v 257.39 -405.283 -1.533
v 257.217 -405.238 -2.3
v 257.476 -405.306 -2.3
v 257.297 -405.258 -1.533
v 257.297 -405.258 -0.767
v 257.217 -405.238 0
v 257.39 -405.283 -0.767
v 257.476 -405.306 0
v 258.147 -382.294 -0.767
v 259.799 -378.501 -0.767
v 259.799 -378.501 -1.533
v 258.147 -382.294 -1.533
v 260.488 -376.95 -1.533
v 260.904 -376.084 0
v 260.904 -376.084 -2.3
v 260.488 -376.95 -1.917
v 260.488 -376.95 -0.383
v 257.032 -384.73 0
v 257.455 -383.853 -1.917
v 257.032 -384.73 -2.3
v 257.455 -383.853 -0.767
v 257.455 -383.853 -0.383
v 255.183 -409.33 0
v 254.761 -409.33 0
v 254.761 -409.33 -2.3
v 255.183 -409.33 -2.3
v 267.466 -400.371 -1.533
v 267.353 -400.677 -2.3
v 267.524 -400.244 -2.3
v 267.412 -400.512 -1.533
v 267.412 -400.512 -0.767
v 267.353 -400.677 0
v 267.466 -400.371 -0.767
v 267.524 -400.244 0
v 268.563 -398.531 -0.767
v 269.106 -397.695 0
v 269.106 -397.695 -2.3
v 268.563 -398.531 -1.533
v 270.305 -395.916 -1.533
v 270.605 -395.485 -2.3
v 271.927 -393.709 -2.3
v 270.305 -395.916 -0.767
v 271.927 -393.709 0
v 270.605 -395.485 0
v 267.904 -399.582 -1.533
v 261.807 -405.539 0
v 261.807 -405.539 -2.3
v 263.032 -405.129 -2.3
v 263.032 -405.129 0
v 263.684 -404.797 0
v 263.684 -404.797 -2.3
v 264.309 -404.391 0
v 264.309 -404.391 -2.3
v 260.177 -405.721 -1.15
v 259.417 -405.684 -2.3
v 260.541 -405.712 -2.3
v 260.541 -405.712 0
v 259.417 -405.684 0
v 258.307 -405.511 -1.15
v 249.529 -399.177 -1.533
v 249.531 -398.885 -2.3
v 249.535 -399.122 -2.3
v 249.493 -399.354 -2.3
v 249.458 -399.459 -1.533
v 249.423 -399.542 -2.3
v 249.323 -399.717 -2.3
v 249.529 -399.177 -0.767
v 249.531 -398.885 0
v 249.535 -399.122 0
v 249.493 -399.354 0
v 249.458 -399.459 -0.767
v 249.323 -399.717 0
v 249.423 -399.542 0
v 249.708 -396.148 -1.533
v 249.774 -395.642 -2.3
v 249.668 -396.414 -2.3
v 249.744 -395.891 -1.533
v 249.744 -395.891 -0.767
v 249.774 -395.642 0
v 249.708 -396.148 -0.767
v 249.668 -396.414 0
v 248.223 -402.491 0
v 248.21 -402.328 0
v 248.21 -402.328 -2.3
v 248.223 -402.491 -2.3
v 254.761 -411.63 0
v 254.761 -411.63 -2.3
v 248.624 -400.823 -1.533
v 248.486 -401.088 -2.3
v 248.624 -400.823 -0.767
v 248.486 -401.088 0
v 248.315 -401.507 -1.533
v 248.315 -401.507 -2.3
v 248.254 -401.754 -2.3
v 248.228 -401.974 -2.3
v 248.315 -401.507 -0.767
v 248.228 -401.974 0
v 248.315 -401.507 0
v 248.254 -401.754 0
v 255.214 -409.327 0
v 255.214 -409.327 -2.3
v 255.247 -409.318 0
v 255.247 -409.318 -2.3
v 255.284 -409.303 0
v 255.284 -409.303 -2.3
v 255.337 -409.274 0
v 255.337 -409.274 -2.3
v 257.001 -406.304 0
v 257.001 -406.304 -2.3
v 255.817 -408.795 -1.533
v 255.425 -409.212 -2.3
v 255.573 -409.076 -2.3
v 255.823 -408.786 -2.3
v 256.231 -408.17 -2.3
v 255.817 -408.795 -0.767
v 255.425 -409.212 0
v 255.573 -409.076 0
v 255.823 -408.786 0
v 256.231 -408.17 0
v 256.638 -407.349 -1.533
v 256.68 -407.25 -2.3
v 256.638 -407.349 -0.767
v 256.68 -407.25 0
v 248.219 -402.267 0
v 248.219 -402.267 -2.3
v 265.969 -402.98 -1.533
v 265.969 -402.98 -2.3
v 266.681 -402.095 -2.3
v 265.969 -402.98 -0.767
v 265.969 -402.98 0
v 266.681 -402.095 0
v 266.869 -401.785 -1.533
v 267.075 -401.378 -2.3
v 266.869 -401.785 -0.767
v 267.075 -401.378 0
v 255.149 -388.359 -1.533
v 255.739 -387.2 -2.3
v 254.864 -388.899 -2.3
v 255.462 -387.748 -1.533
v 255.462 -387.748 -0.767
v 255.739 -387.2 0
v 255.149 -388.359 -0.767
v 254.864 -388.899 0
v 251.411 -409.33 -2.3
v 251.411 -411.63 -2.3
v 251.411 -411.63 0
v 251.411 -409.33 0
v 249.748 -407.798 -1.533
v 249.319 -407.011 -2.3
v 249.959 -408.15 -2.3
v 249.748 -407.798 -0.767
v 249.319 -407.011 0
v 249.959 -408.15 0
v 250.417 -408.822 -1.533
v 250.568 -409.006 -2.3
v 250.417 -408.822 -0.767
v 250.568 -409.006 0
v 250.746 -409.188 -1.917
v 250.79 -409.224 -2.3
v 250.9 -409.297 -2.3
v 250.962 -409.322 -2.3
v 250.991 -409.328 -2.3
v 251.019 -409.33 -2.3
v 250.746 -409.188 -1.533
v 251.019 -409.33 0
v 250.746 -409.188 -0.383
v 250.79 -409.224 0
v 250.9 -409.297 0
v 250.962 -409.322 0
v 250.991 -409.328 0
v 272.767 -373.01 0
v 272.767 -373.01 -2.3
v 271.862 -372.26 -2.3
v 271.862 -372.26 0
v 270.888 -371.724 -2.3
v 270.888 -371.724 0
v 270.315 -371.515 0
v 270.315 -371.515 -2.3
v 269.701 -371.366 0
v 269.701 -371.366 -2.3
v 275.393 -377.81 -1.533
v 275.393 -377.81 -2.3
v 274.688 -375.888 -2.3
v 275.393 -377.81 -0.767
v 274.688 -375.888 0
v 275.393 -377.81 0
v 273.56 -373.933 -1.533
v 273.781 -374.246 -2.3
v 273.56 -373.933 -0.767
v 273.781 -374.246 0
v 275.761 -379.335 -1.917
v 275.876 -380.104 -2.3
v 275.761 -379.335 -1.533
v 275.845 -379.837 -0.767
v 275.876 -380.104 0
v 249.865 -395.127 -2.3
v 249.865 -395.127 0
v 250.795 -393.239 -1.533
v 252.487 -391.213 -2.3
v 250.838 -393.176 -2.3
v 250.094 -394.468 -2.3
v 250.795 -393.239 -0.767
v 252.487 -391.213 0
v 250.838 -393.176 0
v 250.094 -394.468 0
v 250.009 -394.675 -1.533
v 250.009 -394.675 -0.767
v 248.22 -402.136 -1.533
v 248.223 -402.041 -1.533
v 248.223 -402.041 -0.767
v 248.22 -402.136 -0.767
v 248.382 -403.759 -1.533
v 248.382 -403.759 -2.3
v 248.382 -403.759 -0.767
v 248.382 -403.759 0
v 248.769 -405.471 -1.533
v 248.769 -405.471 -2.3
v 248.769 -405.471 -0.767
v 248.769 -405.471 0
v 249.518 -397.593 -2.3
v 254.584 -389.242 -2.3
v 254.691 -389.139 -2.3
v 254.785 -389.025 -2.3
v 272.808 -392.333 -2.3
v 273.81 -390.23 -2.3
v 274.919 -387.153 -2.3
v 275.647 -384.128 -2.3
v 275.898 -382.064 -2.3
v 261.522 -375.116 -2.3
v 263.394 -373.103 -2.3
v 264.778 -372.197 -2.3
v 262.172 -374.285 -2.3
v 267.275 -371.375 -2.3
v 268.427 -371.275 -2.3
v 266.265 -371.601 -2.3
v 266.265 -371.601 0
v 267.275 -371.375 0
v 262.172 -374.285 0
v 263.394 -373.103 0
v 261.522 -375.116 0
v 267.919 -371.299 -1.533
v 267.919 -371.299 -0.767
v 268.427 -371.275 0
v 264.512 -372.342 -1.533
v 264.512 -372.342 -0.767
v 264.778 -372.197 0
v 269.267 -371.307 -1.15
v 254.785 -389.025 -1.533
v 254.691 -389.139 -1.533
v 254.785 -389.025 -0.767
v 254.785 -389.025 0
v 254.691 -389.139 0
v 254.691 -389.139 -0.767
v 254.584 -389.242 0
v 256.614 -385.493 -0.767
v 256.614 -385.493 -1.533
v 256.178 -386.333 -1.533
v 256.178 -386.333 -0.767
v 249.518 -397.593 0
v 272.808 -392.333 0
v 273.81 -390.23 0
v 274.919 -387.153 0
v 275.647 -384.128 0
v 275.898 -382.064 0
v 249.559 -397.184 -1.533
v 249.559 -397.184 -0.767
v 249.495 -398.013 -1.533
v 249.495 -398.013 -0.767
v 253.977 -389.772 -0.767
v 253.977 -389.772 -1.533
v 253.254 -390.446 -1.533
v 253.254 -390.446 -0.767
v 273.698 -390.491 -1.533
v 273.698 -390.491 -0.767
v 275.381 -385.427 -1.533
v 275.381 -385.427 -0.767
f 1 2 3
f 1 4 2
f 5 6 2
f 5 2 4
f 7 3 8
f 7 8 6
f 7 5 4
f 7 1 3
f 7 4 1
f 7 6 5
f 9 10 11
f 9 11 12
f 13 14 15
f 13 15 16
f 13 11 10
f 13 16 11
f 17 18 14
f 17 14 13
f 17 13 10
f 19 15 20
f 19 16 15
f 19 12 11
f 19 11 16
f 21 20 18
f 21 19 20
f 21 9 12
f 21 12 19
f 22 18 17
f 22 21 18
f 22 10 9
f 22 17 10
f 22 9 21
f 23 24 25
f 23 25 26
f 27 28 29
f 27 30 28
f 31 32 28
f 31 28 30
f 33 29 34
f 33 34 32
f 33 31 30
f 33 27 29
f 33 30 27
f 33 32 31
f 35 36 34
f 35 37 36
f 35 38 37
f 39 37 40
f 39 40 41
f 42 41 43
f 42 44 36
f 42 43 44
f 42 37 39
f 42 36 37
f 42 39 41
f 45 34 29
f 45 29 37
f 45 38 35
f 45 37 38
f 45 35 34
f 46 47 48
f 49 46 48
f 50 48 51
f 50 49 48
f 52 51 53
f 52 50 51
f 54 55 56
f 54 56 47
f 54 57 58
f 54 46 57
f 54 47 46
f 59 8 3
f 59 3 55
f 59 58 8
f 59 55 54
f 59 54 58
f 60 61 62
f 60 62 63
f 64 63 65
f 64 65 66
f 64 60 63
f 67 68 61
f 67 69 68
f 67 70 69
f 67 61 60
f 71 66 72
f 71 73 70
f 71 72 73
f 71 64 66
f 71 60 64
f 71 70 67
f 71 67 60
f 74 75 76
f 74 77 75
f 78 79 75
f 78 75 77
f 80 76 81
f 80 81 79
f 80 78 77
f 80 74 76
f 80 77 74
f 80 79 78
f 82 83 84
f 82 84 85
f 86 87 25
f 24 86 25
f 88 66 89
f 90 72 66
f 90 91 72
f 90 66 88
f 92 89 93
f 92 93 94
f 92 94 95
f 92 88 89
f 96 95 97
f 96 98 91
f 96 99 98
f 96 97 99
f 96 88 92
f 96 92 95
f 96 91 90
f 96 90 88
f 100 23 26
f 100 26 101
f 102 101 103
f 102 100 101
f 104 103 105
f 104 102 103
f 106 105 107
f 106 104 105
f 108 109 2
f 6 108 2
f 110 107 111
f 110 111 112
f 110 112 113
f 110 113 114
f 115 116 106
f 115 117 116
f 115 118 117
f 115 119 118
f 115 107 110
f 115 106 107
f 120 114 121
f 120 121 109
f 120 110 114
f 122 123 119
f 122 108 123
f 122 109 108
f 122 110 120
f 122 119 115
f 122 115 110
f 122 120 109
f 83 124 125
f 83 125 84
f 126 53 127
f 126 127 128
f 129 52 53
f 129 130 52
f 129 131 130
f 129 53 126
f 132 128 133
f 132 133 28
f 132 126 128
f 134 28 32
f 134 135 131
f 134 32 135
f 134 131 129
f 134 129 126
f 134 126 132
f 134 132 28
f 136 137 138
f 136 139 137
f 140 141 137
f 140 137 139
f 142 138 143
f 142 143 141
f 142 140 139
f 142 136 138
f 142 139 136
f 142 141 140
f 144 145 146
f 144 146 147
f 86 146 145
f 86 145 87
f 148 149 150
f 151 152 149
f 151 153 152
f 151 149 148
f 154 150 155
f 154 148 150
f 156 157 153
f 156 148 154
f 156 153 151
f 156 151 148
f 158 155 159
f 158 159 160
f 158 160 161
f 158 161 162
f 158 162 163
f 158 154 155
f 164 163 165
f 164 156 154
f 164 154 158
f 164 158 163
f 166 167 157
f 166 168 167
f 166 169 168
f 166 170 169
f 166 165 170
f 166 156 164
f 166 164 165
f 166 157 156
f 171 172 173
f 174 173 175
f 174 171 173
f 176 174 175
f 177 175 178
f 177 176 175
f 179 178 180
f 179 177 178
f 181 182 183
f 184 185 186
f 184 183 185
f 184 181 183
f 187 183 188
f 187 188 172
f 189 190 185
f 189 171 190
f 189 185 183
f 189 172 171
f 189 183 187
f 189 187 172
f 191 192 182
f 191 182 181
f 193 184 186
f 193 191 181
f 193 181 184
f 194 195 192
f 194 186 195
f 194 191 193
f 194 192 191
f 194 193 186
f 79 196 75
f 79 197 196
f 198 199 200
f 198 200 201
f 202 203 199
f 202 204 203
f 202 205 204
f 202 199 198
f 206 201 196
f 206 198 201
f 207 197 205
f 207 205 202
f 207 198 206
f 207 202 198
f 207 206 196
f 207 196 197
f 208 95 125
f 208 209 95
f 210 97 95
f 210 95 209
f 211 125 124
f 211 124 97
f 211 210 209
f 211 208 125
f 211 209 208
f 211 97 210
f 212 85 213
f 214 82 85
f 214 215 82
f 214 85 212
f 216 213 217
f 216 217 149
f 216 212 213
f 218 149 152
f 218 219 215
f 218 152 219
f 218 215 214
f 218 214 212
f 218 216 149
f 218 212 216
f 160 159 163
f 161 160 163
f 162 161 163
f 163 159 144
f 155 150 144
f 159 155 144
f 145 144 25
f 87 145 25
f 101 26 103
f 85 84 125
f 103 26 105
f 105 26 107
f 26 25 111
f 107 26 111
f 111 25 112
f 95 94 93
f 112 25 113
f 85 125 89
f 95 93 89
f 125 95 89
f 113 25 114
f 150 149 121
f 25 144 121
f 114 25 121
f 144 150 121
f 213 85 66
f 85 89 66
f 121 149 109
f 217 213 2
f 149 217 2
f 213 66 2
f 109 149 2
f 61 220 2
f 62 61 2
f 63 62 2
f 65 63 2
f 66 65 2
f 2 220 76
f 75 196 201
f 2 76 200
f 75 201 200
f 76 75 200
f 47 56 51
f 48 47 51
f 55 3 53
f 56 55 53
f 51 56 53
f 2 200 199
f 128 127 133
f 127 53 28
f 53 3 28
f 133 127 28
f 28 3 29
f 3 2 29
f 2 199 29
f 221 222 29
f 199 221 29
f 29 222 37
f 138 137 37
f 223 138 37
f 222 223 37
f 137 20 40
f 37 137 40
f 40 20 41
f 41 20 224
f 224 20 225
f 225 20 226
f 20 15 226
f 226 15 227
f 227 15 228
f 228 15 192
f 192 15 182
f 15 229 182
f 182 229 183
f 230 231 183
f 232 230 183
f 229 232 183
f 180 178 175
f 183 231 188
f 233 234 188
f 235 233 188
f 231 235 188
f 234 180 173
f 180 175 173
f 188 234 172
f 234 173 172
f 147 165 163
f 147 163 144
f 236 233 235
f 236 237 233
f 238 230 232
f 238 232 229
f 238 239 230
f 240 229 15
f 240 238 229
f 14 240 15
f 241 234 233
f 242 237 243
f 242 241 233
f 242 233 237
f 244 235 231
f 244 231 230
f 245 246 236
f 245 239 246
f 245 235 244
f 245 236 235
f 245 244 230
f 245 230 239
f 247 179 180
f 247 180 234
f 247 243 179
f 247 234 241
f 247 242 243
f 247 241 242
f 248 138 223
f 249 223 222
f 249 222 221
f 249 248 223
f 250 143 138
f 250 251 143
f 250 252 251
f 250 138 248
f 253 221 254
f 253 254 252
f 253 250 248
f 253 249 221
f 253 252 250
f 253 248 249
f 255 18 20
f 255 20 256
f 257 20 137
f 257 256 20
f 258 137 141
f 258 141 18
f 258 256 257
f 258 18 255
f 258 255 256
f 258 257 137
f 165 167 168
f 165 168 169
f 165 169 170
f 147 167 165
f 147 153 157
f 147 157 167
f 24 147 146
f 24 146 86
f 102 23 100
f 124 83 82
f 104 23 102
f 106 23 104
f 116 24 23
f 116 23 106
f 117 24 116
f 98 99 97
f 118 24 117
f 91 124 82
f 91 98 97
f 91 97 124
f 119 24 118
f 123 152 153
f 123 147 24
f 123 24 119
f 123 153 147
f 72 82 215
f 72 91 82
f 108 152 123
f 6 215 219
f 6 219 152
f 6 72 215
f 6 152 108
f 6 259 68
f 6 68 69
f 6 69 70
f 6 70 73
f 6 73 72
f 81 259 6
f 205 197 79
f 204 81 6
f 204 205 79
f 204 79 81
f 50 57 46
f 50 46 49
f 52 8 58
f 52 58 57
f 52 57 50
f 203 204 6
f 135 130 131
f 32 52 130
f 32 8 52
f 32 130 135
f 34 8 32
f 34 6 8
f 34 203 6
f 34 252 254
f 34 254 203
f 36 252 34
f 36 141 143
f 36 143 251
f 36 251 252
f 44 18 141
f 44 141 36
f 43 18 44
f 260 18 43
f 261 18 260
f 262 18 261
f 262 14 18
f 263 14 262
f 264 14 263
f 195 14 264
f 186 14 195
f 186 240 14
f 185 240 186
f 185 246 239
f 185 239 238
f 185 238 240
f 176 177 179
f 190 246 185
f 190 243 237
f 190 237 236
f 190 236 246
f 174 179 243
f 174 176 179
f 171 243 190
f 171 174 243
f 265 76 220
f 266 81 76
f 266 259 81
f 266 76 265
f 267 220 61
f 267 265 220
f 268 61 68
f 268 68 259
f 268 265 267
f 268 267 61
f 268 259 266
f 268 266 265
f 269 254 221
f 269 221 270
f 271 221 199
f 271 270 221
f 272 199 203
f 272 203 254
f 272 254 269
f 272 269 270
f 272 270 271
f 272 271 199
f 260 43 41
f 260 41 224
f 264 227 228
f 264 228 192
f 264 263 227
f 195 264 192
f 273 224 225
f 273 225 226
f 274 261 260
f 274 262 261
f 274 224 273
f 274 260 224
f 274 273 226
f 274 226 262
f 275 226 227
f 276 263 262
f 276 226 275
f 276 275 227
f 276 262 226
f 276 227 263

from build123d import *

# Parameters (mm, degrees)
BASE_FLANGE1_DEPTH = 2.3
SKETCH6_W          = 3.35
SKETCH6_H          = 2.3
TAB1_DEPTH         = 2.3


# Sheet-metal steps are written as plain solids
with BuildPart() as part:
    # Model → Base-Flange1 (new body)
    with BuildSketch(Plane.XY):
        with BuildLine():
            Line((248.218742139, -402.267177227), (248.210301655, -402.327638653))
            Line((248.210301655, -402.327638653), (248.222510212, -402.491323752))
            add(Edge.make_bspline(
                [(248.222510212, -402.491323752), (248.246022989, -403.332056241), (248.70901563, -405.763218763), (249.319354503, -407.010912211)],
                knots=[15, 15, 15, 15, 16, 16, 16, 16], degree=3))
            add(Edge.make_bspline(
                [(249.319354503, -407.010912211), (249.523464167, -407.428166136), (250.554572065, -409.330398118), (251.019073512, -409.330398118)],
                knots=[16, 16, 16, 16, 17, 17, 17, 17], degree=3))
            Line((251.019073512, -409.330398118), (255.183497951, -409.330398118))
            add(Edge.make_bspline(
                [(255.183497951, -409.330398118), (255.57849992, -409.330398118), (256.903800339, -407.601307276), (257.216965505, -405.238012255)],
                knots=[18, 18, 18, 18, 19, 19, 19, 19], degree=3))
            add(Edge.make_bspline(
                [(257.216965505, -405.238012255), (257.282443851, -405.253687439), (257.400782881, -405.285511509), (257.476488854, -405.305880636)],
                knots=[19, 19, 19, 19, 20, 20, 20, 20], degree=3))
            add(Edge.make_bspline(
                [(257.476488854, -405.305880636), (258.053585412, -405.461039124), (259.01894423, -405.720627069), (260.177228396, -405.720627069)],
                knots=[20, 20, 20, 20, 21, 21, 21, 21], degree=3))
            add(Edge.make_bspline(
                [(260.177228396, -405.720627069), (261.701597021, -405.720627069), (263.091822241, -405.273152229), (264.309275921, -404.390604893)],
                knots=[21, 21, 21, 21, 22, 22, 22, 22], degree=3))
            add(Edge.make_bspline(
                [(264.309275921, -404.390604893), (266.463709447, -402.828426345), (266.962343955, -401.784562413), (267.352996251, -400.677050342)],
                knots=[22, 22, 22, 22, 23, 23, 23, 23], degree=3))
            add(Edge.make_bspline(
                [(267.352996251, -400.677050342), (267.416579794, -400.496828784), (267.462485692, -400.366647239), (267.523872987, -400.243872648)],
                knots=[23, 23, 23, 23, 24, 24, 24, 24], degree=3))
            add(Edge.make_bspline(
                [(267.523872987, -400.243872648), (267.937370572, -399.417178923), (270.638605347, -395.276389468), (271.926597358, -393.708698768)],
                knots=[24, 24, 24, 24, 25, 25, 25, 25], degree=3))
            add(Edge.make_bspline(
                [(271.926597358, -393.708698768), (273.376056688, -391.944379242), (276.34214037, -385.026811485), (275.876086264, -380.104114983)],
                knots=[25, 25, 25, 25, 26, 26, 26, 26], degree=3))
            add(Edge.make_bspline(
                [(275.876086264, -380.104114983), (275.8417645, -379.564656094), (274.799645491, -372.313924687), (269.70086935, -371.365600484)],
                knots=[0, 0, 0, 0, 1, 1, 1, 1], degree=3))
            add(Edge.make_bspline(
                [(269.70086935, -371.365600484), (269.207450344, -371.273829209), (264.137348452, -370.462620652), (260.904098088, -376.084398314)],
                knots=[1, 1, 1, 1, 2, 2, 2, 2], degree=3))
            add(Edge.make_bspline(
                [(260.904098088, -376.084398314), (260.433751909, -376.902207435), (257.516322771, -383.883501762), (257.032437578, -384.730177041)],
                knots=[2, 2, 2, 2, 3, 3, 3, 3], degree=3))
            add(Edge.make_bspline(
                [(257.032437578, -384.730177041), (256.627208222, -385.439479138), (256.175534672, -386.334514945), (255.738718096, -387.200052122)],
                knots=[3, 3, 3, 3, 4, 4, 4, 4], degree=3))
            add(Edge.make_bspline(
                [(255.738718096, -387.200052122), (255.500946273, -387.671364299), (255.11366392, -388.439088056), (254.863555112, -388.899096881)],
                knots=[4, 4, 4, 4, 5, 5, 5, 5], degree=3))
            add(Edge.make_bspline(
                [(254.863555112, -388.899096881), (254.791907734, -389.030873232), (254.698271896, -389.145280785), (254.58356807, -389.241931628)],
                knots=[5, 5, 5, 5, 6, 6, 6, 6], degree=3))
            add(Edge.make_bspline(
                [(254.58356807, -389.241931628), (254.060651196, -389.68254776), (253.251264748, -390.417536599), (252.487366168, -391.213071598)],
                knots=[6, 6, 6, 6, 7, 7, 7, 7], degree=3))
            add(Edge.make_bspline(
                [(252.487366168, -391.213071598), (250.221699122, -393.572574432), (249.853612202, -394.87055722), (249.773793646, -395.641655717)],
                knots=[7, 7, 7, 7, 8, 8, 8, 8], degree=3))
            add(Edge.make_bspline(
                [(249.773793646, -395.641655717), (249.748472194, -395.887075707), (249.70937036, -396.14291711), (249.667964619, -396.413744679)],
                knots=[8, 8, 8, 8, 9, 9, 9, 9], degree=3))
            add(Edge.make_bspline(
                [(249.667964619, -396.413744679), (249.5552028, -397.150487356), (249.42571589, -397.996549574), (249.530537872, -398.885487222)],
                knots=[9, 9, 9, 9, 10, 10, 10, 10], degree=3))
            add(Edge.make_bspline(
                [(249.530537872, -398.885487222), (249.565005835, -399.177791085), (249.489477062, -399.47455308), (249.322935943, -399.717233208)],
                knots=[10, 10, 10, 10, 11, 11, 11, 11], degree=3))
            add(Edge.make_bspline(
                [(249.322935943, -399.717233208), (248.372080781, -401.102798846), (248.260421691, -401.546272976), (248.227591728, -401.973655092)],
                knots=[11, 11, 11, 11, 12, 12, 12, 12], degree=3))
            add(Edge.make_bspline(
                [(248.227591728, -401.973655092), (248.223328422, -402.029207256), (248.218354566, -402.115851408), (248.218742139, -402.267177227)],
                knots=[12, 12, 12, 12, 13, 13, 13, 13], degree=3))
        make_face()
    extrude(amount=-BASE_FLANGE1_DEPTH)

    # Sketch6 → Tab1 (add)
    with BuildSketch(Plane.XY):
        with Locations((253.086490394, -410.480398118)):
            Rectangle(SKETCH6_W, SKETCH6_H)
    extrude(amount=-TAB1_DEPTH)


solid = part.part
